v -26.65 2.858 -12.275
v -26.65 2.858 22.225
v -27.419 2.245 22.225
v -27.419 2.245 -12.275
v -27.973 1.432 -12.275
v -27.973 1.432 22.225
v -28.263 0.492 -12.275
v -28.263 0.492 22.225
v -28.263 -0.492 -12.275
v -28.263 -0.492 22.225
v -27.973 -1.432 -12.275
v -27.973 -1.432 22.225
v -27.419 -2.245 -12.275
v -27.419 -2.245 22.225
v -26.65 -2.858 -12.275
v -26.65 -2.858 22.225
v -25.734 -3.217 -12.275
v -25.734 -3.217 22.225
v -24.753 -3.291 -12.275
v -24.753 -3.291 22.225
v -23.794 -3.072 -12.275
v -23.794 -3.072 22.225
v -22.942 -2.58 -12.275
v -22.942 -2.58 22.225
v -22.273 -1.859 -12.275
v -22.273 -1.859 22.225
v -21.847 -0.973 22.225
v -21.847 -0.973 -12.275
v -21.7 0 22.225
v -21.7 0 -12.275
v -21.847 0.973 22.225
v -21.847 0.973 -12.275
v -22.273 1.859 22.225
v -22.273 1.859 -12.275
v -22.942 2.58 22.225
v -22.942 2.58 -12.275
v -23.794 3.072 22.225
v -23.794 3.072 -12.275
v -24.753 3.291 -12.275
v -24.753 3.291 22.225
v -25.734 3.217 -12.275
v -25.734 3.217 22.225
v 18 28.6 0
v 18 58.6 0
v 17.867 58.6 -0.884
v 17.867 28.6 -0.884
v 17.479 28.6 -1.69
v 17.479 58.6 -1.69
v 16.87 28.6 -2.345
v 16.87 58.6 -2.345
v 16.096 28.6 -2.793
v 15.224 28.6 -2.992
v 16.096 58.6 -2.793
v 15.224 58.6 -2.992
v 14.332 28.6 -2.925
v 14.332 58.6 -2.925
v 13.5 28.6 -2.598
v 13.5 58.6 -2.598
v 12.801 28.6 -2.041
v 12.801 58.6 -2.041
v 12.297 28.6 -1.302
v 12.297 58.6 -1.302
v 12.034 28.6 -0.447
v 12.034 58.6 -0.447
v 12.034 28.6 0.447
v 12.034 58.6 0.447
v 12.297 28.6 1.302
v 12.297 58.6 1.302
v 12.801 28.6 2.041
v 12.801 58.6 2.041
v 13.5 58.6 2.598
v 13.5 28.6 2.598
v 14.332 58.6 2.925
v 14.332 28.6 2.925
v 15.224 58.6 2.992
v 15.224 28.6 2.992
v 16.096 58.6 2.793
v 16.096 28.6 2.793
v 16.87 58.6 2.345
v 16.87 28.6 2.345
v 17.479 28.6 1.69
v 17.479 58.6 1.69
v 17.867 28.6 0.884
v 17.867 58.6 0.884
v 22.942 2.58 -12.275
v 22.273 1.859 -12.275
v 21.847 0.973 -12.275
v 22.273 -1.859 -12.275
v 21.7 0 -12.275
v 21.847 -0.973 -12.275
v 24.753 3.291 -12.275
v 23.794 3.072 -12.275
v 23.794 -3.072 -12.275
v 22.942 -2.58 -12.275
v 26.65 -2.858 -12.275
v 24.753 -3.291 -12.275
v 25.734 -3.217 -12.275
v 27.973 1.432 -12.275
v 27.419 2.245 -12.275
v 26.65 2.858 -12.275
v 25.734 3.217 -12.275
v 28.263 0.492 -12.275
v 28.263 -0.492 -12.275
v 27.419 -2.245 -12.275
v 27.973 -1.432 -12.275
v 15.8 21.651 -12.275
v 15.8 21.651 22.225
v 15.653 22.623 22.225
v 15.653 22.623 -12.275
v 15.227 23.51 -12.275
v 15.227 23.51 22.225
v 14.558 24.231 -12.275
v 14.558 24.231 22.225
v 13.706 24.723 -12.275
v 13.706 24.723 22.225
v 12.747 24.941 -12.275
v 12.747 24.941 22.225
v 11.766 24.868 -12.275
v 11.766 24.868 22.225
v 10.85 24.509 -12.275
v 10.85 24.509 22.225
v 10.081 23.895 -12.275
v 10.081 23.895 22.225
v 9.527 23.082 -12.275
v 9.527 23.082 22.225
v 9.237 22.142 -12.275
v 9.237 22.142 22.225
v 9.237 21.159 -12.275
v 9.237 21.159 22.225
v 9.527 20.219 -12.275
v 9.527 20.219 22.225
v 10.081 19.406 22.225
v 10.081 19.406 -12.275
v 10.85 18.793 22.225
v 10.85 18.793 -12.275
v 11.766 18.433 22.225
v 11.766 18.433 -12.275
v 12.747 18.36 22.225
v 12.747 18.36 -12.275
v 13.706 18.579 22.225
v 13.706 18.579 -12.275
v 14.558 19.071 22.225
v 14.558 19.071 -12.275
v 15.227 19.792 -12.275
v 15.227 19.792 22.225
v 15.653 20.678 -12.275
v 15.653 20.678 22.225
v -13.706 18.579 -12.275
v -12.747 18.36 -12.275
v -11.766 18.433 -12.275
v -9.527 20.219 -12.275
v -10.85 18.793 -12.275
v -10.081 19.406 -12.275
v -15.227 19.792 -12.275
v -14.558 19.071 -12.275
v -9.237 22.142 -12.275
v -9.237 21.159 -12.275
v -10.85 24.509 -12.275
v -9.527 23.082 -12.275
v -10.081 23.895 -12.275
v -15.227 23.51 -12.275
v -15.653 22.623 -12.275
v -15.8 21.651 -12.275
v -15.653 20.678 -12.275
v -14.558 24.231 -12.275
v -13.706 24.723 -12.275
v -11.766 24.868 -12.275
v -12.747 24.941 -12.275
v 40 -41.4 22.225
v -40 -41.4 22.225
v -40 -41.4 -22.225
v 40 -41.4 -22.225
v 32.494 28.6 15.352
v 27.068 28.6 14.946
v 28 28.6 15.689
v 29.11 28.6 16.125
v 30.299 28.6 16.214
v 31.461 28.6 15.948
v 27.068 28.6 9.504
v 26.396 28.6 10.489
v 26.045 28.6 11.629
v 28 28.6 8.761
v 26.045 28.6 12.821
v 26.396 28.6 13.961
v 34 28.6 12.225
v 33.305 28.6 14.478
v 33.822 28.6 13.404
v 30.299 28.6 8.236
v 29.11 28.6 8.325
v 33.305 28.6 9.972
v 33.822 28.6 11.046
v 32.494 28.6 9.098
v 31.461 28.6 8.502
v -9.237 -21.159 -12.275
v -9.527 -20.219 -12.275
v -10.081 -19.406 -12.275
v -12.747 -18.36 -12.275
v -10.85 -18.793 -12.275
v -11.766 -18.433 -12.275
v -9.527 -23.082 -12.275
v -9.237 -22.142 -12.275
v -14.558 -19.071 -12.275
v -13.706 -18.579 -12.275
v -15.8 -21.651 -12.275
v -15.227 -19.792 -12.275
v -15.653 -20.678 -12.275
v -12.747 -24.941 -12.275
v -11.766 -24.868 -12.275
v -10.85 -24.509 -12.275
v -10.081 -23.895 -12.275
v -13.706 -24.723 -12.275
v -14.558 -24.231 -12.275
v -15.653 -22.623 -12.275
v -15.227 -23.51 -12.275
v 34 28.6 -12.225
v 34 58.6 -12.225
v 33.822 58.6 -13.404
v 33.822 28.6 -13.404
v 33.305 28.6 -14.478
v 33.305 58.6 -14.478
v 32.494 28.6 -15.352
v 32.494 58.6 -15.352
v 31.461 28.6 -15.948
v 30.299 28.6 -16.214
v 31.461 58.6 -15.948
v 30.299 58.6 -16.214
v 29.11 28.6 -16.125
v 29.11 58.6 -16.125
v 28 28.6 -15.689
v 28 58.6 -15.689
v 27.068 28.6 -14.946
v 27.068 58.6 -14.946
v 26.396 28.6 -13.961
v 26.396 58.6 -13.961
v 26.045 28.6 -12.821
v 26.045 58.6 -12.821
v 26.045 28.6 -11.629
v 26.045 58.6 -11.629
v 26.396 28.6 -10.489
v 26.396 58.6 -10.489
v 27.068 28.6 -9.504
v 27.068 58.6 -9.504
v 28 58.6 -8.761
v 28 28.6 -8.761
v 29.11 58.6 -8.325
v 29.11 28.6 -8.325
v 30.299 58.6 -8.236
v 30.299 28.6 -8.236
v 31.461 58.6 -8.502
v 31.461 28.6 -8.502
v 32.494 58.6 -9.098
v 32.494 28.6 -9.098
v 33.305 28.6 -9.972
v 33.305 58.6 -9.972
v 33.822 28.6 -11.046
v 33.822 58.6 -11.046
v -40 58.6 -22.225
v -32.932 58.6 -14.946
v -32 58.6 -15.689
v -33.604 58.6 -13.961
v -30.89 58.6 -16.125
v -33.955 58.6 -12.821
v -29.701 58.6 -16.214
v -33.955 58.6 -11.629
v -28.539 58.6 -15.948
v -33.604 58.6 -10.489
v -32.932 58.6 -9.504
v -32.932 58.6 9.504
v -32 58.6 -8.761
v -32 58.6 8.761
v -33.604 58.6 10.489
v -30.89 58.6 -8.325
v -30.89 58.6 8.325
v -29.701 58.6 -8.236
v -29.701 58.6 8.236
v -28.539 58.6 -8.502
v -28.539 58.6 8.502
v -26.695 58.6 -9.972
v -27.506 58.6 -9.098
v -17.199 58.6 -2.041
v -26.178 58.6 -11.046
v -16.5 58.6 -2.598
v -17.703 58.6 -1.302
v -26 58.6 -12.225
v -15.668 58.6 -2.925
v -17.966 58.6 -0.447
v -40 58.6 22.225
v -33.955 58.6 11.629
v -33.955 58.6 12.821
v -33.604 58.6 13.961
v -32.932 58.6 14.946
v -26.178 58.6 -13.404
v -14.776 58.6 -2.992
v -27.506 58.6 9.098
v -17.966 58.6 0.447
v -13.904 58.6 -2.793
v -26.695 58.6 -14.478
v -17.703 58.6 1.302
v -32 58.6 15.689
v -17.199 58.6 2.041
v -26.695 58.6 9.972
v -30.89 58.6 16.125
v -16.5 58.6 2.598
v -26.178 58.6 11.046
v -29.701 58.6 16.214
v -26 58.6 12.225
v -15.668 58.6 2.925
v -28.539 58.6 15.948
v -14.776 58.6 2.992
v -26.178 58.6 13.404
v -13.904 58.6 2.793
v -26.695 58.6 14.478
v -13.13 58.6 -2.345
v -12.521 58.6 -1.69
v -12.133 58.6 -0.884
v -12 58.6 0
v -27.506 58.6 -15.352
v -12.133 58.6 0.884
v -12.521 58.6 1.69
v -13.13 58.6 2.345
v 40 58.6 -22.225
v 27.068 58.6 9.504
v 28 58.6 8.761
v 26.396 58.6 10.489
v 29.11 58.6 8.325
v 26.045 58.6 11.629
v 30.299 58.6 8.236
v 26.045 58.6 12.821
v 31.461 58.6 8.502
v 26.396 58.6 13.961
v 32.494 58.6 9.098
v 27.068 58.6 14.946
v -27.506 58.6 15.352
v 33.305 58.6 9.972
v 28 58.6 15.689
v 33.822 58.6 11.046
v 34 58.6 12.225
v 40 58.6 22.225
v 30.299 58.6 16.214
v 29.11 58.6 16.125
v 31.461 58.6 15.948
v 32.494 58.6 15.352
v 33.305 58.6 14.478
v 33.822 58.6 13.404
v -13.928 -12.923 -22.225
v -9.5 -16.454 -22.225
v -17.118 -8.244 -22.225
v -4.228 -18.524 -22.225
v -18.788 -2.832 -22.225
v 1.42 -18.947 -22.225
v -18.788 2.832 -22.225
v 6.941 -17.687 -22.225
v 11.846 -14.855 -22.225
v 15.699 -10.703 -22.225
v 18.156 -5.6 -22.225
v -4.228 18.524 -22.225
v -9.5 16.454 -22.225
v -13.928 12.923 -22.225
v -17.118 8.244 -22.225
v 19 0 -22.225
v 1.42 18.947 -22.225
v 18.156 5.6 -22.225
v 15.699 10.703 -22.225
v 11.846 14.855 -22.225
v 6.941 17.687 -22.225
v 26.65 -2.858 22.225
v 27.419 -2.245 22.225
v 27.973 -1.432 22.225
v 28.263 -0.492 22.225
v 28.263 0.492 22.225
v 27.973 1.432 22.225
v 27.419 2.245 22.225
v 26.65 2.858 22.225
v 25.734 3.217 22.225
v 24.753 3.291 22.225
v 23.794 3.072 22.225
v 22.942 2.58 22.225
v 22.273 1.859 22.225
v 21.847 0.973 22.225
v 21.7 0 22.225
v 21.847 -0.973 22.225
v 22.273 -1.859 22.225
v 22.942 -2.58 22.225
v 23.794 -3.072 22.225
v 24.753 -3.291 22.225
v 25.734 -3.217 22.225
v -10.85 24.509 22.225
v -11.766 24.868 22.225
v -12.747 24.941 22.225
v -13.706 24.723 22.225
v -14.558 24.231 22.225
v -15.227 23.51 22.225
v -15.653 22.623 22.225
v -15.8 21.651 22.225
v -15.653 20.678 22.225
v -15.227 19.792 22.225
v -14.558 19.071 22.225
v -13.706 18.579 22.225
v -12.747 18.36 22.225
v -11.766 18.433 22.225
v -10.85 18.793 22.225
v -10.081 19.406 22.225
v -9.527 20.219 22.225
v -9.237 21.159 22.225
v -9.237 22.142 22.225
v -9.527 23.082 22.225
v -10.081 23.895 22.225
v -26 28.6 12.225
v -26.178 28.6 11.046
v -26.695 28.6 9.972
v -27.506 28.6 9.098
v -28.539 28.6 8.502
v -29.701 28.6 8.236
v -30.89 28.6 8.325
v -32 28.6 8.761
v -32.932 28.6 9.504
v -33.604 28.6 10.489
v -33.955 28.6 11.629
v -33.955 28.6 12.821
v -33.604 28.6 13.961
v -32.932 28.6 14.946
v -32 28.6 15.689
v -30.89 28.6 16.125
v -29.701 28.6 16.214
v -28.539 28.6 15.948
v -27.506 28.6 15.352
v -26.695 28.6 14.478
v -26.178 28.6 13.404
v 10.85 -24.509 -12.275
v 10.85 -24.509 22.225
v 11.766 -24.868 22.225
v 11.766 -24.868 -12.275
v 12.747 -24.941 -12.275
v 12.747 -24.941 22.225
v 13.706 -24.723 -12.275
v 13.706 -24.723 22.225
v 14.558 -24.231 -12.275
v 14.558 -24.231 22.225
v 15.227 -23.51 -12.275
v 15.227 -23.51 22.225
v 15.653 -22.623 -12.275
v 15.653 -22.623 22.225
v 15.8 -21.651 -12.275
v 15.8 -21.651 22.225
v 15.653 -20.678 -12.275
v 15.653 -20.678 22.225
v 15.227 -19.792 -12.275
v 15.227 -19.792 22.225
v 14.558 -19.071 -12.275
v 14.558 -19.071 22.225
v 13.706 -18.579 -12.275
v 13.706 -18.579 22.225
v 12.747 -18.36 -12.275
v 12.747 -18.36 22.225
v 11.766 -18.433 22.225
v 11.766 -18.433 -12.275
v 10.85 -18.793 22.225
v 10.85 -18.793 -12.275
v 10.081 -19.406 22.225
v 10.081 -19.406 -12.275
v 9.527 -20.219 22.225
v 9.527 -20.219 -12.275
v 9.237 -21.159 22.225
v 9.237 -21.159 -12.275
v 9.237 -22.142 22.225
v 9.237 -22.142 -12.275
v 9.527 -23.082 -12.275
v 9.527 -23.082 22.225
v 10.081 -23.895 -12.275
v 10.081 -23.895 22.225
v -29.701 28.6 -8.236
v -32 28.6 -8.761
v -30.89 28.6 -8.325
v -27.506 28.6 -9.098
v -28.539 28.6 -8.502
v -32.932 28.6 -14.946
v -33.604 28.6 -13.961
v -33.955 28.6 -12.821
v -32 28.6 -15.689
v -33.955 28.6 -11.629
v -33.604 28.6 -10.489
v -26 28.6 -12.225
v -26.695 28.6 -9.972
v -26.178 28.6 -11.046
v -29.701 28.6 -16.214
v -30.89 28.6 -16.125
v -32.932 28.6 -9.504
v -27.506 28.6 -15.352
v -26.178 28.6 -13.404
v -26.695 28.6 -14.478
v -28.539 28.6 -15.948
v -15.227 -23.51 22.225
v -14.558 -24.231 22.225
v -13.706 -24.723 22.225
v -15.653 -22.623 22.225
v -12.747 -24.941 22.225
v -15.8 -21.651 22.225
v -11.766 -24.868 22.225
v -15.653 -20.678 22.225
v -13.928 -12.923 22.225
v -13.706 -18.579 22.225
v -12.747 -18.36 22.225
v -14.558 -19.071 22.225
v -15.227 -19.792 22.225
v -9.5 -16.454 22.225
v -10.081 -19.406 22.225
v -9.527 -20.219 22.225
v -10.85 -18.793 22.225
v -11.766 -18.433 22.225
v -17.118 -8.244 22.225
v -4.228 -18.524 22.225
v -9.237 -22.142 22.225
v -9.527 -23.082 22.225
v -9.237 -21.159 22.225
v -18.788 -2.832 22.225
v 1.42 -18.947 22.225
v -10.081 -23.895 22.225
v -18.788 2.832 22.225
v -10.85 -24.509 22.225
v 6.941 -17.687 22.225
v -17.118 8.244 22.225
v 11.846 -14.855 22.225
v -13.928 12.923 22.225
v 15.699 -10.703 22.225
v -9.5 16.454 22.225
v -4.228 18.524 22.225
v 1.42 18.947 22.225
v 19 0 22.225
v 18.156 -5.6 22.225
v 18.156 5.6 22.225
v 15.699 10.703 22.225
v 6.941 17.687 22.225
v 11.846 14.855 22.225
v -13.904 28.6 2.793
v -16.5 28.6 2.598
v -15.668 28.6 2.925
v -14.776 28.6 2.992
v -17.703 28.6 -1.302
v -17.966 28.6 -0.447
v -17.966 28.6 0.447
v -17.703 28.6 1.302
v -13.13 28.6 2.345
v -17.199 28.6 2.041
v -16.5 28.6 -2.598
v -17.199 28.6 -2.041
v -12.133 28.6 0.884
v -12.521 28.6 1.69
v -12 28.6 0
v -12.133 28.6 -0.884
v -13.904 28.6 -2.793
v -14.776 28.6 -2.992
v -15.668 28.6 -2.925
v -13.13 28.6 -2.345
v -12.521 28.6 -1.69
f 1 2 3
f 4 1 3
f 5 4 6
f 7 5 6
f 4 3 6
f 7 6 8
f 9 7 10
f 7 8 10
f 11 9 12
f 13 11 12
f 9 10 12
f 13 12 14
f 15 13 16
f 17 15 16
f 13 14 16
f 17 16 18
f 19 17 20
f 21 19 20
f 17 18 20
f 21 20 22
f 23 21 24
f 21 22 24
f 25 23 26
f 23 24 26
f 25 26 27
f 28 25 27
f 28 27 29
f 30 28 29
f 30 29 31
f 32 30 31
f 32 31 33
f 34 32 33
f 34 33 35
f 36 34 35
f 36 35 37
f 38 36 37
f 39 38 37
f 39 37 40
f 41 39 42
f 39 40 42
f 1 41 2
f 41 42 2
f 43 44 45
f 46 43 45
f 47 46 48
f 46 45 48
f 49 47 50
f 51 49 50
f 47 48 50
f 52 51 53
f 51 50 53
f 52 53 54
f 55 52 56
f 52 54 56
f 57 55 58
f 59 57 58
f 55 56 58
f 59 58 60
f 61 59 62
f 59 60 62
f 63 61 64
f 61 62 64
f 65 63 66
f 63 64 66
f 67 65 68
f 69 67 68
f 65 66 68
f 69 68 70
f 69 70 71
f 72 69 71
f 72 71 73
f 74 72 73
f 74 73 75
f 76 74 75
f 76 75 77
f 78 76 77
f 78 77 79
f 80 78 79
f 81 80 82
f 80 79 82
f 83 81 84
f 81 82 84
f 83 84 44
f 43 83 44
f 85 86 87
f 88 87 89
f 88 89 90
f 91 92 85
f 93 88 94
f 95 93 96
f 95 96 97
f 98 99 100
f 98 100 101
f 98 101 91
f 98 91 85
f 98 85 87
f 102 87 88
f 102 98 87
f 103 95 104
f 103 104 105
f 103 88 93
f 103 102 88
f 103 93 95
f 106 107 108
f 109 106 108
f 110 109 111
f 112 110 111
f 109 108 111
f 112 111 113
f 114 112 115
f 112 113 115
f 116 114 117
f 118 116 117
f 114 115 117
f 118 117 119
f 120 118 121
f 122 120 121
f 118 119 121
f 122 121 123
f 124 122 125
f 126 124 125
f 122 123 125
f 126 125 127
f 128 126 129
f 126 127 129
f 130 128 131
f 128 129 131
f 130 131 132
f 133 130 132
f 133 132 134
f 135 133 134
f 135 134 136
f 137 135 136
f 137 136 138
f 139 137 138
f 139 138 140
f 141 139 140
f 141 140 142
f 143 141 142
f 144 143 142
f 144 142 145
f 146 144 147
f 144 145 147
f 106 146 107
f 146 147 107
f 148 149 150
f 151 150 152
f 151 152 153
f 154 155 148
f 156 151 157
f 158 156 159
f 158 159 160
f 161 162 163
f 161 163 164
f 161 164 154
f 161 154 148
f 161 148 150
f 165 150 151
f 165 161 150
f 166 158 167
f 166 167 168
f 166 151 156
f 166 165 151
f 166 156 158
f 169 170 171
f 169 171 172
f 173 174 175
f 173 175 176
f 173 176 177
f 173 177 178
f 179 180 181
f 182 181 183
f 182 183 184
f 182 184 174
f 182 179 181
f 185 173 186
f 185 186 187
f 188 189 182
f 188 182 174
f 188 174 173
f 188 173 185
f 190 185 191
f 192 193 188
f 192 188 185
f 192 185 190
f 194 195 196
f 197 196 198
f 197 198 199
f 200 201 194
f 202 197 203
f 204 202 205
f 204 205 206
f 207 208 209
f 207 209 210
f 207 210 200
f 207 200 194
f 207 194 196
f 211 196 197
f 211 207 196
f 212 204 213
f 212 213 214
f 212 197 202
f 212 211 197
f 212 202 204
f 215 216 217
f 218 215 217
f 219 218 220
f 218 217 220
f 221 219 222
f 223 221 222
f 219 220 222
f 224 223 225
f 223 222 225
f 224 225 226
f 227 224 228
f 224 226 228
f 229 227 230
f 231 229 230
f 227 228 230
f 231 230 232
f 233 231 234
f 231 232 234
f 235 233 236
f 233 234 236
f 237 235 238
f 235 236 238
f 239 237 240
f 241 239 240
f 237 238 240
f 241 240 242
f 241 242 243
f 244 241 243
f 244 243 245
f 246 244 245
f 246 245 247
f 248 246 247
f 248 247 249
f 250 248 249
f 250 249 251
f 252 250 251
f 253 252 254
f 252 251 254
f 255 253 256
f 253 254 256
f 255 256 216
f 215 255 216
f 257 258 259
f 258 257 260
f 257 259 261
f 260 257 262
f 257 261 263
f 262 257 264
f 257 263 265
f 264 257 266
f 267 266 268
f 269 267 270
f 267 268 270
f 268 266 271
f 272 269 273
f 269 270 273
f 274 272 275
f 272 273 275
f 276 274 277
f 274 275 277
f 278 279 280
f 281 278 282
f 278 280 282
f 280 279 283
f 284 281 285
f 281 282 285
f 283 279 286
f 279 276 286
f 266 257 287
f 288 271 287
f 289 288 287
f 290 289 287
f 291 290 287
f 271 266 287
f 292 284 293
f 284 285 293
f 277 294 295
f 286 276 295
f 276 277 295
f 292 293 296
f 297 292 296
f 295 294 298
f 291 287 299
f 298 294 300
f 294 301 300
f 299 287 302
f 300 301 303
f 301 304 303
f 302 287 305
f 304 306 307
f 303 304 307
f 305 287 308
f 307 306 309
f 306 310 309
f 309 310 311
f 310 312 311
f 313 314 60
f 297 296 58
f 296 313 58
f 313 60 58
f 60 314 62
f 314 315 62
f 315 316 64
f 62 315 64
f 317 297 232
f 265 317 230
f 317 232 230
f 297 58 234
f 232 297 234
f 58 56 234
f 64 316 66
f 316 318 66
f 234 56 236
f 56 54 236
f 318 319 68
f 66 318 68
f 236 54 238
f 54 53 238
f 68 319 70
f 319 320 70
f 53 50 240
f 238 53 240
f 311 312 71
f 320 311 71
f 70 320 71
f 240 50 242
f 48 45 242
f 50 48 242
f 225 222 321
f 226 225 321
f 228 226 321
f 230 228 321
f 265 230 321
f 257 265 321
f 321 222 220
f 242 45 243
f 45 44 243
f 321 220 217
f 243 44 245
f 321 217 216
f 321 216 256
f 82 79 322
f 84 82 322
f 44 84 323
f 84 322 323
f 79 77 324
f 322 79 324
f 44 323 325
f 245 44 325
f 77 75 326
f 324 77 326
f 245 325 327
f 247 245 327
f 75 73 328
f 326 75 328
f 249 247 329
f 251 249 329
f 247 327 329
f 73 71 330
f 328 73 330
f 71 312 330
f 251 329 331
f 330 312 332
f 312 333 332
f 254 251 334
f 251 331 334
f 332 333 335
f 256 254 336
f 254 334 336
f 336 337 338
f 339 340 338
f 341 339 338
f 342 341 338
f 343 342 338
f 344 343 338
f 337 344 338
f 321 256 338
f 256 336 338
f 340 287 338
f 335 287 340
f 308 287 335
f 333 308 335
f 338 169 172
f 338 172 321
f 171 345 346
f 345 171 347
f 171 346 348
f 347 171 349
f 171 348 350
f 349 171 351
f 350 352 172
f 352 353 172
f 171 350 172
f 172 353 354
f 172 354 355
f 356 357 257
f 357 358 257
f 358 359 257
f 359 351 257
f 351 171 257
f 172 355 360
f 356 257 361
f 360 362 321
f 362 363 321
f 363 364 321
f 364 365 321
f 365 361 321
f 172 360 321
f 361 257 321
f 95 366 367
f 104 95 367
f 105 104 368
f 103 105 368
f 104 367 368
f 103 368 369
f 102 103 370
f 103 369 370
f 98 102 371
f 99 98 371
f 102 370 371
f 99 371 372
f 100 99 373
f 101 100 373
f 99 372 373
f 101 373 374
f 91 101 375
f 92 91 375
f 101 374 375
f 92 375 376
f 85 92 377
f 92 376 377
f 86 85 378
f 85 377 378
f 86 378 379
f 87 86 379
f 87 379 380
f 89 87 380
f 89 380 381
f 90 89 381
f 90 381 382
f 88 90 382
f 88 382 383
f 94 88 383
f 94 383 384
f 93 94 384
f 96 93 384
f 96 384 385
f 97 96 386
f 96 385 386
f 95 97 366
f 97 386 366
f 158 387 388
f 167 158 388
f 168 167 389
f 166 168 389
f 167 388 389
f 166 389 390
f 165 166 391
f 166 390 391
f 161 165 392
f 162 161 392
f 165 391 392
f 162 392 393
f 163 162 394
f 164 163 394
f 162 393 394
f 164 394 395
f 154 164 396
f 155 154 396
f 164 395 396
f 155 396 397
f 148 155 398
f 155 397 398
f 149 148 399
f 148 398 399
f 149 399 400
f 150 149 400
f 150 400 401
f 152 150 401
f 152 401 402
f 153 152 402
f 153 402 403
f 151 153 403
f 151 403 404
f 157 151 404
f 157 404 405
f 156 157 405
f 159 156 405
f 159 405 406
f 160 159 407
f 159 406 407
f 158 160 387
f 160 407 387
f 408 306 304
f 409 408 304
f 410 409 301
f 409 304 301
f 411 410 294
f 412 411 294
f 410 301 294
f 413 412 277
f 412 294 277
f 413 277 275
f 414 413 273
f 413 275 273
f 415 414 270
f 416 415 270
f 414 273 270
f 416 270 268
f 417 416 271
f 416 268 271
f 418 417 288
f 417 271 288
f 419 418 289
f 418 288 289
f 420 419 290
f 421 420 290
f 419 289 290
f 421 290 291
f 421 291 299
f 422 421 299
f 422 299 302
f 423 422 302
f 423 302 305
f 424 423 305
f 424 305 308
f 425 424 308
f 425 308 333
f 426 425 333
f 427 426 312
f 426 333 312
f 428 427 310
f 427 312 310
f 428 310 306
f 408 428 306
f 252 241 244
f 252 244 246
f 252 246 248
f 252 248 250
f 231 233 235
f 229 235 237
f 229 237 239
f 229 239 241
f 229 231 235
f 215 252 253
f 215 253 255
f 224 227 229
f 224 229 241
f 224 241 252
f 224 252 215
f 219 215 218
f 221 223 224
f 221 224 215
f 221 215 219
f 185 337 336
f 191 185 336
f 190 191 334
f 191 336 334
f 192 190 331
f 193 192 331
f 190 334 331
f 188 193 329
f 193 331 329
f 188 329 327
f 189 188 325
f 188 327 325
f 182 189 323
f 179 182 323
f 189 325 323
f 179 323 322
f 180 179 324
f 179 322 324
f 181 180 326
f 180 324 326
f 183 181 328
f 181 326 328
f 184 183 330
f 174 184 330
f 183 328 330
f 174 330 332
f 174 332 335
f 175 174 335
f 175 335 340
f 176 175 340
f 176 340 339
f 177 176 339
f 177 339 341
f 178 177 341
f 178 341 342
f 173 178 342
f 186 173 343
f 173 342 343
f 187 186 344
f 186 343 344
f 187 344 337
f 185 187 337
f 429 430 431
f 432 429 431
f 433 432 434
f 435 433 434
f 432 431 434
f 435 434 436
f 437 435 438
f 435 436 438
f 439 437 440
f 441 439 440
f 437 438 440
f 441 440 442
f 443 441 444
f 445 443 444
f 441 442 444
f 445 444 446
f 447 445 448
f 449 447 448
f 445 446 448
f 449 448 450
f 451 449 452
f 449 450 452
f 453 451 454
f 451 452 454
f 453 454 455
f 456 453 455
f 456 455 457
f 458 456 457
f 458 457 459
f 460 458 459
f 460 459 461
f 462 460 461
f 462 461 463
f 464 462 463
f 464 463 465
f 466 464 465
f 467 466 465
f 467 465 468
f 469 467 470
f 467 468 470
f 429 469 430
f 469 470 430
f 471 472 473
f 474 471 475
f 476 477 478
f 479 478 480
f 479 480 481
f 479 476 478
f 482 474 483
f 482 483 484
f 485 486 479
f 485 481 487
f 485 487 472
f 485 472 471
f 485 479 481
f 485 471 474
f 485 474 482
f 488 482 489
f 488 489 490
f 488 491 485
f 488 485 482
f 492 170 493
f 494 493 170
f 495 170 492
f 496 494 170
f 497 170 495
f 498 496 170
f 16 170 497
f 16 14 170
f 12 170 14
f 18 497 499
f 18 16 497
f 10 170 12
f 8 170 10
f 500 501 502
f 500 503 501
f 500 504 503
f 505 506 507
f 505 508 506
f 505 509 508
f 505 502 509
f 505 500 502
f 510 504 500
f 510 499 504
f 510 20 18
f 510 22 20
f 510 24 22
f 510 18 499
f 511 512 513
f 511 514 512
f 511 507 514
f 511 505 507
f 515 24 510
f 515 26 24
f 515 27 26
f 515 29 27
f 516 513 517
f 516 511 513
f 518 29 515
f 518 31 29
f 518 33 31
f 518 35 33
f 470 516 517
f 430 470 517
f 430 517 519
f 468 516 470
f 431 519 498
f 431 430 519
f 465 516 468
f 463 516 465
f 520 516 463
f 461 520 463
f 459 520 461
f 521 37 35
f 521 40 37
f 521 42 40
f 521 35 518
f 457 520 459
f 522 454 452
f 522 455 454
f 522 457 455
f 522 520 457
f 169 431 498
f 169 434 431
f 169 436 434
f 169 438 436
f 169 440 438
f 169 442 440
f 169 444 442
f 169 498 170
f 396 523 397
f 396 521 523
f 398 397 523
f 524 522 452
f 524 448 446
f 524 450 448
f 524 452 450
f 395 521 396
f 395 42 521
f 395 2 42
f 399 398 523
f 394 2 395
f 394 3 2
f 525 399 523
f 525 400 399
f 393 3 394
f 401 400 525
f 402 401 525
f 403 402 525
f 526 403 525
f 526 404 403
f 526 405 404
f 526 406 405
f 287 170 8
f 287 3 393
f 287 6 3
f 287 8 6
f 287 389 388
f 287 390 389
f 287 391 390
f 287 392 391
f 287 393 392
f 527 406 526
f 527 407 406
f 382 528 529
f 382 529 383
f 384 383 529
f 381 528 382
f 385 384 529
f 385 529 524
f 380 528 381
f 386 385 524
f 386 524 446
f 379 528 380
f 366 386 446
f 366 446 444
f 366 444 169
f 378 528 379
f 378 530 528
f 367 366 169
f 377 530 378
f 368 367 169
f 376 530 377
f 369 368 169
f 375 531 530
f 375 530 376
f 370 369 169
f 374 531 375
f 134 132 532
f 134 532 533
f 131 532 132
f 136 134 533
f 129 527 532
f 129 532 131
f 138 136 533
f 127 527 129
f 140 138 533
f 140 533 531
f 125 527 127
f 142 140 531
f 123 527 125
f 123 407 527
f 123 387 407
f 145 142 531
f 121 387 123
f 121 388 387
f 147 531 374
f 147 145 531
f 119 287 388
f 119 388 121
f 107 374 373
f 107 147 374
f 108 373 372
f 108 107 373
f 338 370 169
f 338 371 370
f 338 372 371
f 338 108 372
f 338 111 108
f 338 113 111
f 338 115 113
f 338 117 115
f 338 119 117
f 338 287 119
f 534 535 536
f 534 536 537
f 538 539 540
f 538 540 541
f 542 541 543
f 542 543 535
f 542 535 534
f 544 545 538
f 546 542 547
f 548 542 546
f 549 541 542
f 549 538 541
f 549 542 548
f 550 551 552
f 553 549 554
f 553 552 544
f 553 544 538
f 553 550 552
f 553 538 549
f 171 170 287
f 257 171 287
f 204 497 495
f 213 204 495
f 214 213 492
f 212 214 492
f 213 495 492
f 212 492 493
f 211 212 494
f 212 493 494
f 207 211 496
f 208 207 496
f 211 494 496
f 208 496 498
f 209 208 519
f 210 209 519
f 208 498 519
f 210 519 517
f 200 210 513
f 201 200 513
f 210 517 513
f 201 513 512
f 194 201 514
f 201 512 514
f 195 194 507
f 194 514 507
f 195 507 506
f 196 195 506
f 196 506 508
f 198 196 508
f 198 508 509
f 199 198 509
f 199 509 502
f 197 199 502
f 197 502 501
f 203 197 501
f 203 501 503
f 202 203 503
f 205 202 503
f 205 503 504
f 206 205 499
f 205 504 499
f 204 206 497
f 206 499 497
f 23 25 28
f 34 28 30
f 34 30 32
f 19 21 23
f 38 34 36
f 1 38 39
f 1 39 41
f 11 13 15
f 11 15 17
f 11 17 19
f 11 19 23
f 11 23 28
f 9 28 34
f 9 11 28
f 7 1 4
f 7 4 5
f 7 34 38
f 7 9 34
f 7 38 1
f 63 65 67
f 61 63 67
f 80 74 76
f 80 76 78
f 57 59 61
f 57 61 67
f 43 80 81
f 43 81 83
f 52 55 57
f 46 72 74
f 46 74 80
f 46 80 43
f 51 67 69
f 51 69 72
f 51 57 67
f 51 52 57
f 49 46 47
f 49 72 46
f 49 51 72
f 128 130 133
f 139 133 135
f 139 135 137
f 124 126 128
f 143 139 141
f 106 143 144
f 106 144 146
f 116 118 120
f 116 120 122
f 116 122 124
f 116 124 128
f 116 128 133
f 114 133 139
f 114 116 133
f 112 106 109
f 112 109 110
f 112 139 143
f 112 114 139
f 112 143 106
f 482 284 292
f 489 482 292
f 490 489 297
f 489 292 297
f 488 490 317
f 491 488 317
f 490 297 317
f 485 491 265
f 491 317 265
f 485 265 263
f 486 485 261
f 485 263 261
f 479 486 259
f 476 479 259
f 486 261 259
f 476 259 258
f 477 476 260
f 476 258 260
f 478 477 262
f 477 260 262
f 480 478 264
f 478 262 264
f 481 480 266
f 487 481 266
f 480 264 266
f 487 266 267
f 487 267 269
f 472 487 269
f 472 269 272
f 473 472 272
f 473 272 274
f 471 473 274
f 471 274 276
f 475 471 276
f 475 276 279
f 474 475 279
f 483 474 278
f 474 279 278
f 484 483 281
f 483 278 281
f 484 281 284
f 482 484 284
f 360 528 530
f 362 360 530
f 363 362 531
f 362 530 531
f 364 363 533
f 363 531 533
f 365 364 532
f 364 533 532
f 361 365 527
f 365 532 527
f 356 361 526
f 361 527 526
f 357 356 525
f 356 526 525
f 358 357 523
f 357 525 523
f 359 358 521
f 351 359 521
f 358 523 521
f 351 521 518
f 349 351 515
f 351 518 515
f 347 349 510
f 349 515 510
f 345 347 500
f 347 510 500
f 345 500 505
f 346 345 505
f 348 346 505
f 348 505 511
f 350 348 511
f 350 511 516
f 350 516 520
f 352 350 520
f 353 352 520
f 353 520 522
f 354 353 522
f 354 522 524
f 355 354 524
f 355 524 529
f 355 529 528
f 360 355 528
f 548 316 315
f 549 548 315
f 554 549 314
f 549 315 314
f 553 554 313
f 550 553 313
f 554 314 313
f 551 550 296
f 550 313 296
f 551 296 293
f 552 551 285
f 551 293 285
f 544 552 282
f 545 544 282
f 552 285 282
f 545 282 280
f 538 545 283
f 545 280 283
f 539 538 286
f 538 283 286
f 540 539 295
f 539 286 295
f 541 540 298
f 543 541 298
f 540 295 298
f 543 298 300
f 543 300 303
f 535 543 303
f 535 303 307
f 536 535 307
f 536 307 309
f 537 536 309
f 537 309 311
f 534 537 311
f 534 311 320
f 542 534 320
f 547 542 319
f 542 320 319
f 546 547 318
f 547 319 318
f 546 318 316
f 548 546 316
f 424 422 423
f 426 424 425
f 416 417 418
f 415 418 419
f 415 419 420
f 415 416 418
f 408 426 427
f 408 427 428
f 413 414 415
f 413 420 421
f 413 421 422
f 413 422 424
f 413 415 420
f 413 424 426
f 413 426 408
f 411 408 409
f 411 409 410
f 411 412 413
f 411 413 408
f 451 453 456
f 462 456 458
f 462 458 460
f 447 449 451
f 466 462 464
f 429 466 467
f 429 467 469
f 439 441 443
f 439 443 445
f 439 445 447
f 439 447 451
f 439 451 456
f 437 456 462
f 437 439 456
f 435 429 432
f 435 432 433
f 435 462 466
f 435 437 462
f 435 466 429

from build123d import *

# Parameters (mm, degrees)
ESBO_O2_W                = 80
ESBO_O2_H                = 117.2
RESSALTO_EXTRUS_O2_DEPTH = 22.225
ESBO_O3_R                = 19
CORTE_EXTRUS_O1_DEPTH    = 45.45
ESBO_O4_R                = 3.3
CORTE_EXTRUS_O2_DEPTH    = 34.5
PADR_OCIRCULAR1_COUNT    = 6
ESBO_O10_R               = 4
ESBO_O10_R_2             = 3
CORTE_EXTRUS_O5_DEPTH    = 30
ESBO_O12_W               = 80
ESBO_O12_H               = 17.2
CORTE_EXTRUS_O7_DEPTH    = 45.45


with BuildPart() as part:
    # Esboço2 → Ressalto-extrusão2 (new body, symmetric)
    with BuildSketch(Plane.XY):
        Rectangle(ESBO_O2_W, ESBO_O2_H)
    extrude(amount=RESSALTO_EXTRUS_O2_DEPTH, both=True)

    # Esboço3 → Corte-extrusão1 (cut, through all)
    with BuildSketch(Plane.XY.offset(22.225)):
        Circle(ESBO_O3_R)
    extrude(amount=-CORTE_EXTRUS_O1_DEPTH, mode=Mode.SUBTRACT)

    # Esboço4 → Corte-extrusão2 (cut)
    with BuildSketch(Plane.XY.offset(22.225)):
        with Locations((12.5, 21.650635095)):
            Circle(ESBO_O4_R)
    corte_extrus_o2 = extrude(amount=-CORTE_EXTRUS_O2_DEPTH, mode=Mode.SUBTRACT)

    # PadrãoCircular1: Corte-extrusão2 ×6 about axis
    padr_ocircular1_axis = Axis((0, 0, 0), (0, 0, 1))
    for i in range(1, PADR_OCIRCULAR1_COUNT):
        add(corte_extrus_o2.rotate(padr_ocircular1_axis, i * 360 / PADR_OCIRCULAR1_COUNT), mode=Mode.SUBTRACT)

    # Esboço10 → Corte-extrusão5 (cut)
    with BuildSketch(Plane(origin=(0, 58.6, 0), x_dir=(1, 0, 0), z_dir=(0, 1, 0))):
        with Locations((-30, 12.225)):
            Circle(ESBO_O10_R)
        with Locations((30, 12.225)):
            Circle(ESBO_O10_R)
        with Locations((-30, -12.225)):
            Circle(ESBO_O10_R)
        with Locations((30, -12.225)):
            Circle(ESBO_O10_R)
        with Locations((-15, 0)):
            Circle(ESBO_O10_R_2)
        with Locations((15, 0)):
            Circle(ESBO_O10_R_2)
    extrude(amount=-CORTE_EXTRUS_O5_DEPTH, mode=Mode.SUBTRACT)

    # Esboço12 → Corte-extrusão7 (cut, through all)
    with BuildSketch(Plane.XY.offset(22.225)):
        with Locations((0, -50)):
            Rectangle(ESBO_O12_W, ESBO_O12_H)
    extrude(amount=-CORTE_EXTRUS_O7_DEPTH, mode=Mode.SUBTRACT)


solid = part.part
